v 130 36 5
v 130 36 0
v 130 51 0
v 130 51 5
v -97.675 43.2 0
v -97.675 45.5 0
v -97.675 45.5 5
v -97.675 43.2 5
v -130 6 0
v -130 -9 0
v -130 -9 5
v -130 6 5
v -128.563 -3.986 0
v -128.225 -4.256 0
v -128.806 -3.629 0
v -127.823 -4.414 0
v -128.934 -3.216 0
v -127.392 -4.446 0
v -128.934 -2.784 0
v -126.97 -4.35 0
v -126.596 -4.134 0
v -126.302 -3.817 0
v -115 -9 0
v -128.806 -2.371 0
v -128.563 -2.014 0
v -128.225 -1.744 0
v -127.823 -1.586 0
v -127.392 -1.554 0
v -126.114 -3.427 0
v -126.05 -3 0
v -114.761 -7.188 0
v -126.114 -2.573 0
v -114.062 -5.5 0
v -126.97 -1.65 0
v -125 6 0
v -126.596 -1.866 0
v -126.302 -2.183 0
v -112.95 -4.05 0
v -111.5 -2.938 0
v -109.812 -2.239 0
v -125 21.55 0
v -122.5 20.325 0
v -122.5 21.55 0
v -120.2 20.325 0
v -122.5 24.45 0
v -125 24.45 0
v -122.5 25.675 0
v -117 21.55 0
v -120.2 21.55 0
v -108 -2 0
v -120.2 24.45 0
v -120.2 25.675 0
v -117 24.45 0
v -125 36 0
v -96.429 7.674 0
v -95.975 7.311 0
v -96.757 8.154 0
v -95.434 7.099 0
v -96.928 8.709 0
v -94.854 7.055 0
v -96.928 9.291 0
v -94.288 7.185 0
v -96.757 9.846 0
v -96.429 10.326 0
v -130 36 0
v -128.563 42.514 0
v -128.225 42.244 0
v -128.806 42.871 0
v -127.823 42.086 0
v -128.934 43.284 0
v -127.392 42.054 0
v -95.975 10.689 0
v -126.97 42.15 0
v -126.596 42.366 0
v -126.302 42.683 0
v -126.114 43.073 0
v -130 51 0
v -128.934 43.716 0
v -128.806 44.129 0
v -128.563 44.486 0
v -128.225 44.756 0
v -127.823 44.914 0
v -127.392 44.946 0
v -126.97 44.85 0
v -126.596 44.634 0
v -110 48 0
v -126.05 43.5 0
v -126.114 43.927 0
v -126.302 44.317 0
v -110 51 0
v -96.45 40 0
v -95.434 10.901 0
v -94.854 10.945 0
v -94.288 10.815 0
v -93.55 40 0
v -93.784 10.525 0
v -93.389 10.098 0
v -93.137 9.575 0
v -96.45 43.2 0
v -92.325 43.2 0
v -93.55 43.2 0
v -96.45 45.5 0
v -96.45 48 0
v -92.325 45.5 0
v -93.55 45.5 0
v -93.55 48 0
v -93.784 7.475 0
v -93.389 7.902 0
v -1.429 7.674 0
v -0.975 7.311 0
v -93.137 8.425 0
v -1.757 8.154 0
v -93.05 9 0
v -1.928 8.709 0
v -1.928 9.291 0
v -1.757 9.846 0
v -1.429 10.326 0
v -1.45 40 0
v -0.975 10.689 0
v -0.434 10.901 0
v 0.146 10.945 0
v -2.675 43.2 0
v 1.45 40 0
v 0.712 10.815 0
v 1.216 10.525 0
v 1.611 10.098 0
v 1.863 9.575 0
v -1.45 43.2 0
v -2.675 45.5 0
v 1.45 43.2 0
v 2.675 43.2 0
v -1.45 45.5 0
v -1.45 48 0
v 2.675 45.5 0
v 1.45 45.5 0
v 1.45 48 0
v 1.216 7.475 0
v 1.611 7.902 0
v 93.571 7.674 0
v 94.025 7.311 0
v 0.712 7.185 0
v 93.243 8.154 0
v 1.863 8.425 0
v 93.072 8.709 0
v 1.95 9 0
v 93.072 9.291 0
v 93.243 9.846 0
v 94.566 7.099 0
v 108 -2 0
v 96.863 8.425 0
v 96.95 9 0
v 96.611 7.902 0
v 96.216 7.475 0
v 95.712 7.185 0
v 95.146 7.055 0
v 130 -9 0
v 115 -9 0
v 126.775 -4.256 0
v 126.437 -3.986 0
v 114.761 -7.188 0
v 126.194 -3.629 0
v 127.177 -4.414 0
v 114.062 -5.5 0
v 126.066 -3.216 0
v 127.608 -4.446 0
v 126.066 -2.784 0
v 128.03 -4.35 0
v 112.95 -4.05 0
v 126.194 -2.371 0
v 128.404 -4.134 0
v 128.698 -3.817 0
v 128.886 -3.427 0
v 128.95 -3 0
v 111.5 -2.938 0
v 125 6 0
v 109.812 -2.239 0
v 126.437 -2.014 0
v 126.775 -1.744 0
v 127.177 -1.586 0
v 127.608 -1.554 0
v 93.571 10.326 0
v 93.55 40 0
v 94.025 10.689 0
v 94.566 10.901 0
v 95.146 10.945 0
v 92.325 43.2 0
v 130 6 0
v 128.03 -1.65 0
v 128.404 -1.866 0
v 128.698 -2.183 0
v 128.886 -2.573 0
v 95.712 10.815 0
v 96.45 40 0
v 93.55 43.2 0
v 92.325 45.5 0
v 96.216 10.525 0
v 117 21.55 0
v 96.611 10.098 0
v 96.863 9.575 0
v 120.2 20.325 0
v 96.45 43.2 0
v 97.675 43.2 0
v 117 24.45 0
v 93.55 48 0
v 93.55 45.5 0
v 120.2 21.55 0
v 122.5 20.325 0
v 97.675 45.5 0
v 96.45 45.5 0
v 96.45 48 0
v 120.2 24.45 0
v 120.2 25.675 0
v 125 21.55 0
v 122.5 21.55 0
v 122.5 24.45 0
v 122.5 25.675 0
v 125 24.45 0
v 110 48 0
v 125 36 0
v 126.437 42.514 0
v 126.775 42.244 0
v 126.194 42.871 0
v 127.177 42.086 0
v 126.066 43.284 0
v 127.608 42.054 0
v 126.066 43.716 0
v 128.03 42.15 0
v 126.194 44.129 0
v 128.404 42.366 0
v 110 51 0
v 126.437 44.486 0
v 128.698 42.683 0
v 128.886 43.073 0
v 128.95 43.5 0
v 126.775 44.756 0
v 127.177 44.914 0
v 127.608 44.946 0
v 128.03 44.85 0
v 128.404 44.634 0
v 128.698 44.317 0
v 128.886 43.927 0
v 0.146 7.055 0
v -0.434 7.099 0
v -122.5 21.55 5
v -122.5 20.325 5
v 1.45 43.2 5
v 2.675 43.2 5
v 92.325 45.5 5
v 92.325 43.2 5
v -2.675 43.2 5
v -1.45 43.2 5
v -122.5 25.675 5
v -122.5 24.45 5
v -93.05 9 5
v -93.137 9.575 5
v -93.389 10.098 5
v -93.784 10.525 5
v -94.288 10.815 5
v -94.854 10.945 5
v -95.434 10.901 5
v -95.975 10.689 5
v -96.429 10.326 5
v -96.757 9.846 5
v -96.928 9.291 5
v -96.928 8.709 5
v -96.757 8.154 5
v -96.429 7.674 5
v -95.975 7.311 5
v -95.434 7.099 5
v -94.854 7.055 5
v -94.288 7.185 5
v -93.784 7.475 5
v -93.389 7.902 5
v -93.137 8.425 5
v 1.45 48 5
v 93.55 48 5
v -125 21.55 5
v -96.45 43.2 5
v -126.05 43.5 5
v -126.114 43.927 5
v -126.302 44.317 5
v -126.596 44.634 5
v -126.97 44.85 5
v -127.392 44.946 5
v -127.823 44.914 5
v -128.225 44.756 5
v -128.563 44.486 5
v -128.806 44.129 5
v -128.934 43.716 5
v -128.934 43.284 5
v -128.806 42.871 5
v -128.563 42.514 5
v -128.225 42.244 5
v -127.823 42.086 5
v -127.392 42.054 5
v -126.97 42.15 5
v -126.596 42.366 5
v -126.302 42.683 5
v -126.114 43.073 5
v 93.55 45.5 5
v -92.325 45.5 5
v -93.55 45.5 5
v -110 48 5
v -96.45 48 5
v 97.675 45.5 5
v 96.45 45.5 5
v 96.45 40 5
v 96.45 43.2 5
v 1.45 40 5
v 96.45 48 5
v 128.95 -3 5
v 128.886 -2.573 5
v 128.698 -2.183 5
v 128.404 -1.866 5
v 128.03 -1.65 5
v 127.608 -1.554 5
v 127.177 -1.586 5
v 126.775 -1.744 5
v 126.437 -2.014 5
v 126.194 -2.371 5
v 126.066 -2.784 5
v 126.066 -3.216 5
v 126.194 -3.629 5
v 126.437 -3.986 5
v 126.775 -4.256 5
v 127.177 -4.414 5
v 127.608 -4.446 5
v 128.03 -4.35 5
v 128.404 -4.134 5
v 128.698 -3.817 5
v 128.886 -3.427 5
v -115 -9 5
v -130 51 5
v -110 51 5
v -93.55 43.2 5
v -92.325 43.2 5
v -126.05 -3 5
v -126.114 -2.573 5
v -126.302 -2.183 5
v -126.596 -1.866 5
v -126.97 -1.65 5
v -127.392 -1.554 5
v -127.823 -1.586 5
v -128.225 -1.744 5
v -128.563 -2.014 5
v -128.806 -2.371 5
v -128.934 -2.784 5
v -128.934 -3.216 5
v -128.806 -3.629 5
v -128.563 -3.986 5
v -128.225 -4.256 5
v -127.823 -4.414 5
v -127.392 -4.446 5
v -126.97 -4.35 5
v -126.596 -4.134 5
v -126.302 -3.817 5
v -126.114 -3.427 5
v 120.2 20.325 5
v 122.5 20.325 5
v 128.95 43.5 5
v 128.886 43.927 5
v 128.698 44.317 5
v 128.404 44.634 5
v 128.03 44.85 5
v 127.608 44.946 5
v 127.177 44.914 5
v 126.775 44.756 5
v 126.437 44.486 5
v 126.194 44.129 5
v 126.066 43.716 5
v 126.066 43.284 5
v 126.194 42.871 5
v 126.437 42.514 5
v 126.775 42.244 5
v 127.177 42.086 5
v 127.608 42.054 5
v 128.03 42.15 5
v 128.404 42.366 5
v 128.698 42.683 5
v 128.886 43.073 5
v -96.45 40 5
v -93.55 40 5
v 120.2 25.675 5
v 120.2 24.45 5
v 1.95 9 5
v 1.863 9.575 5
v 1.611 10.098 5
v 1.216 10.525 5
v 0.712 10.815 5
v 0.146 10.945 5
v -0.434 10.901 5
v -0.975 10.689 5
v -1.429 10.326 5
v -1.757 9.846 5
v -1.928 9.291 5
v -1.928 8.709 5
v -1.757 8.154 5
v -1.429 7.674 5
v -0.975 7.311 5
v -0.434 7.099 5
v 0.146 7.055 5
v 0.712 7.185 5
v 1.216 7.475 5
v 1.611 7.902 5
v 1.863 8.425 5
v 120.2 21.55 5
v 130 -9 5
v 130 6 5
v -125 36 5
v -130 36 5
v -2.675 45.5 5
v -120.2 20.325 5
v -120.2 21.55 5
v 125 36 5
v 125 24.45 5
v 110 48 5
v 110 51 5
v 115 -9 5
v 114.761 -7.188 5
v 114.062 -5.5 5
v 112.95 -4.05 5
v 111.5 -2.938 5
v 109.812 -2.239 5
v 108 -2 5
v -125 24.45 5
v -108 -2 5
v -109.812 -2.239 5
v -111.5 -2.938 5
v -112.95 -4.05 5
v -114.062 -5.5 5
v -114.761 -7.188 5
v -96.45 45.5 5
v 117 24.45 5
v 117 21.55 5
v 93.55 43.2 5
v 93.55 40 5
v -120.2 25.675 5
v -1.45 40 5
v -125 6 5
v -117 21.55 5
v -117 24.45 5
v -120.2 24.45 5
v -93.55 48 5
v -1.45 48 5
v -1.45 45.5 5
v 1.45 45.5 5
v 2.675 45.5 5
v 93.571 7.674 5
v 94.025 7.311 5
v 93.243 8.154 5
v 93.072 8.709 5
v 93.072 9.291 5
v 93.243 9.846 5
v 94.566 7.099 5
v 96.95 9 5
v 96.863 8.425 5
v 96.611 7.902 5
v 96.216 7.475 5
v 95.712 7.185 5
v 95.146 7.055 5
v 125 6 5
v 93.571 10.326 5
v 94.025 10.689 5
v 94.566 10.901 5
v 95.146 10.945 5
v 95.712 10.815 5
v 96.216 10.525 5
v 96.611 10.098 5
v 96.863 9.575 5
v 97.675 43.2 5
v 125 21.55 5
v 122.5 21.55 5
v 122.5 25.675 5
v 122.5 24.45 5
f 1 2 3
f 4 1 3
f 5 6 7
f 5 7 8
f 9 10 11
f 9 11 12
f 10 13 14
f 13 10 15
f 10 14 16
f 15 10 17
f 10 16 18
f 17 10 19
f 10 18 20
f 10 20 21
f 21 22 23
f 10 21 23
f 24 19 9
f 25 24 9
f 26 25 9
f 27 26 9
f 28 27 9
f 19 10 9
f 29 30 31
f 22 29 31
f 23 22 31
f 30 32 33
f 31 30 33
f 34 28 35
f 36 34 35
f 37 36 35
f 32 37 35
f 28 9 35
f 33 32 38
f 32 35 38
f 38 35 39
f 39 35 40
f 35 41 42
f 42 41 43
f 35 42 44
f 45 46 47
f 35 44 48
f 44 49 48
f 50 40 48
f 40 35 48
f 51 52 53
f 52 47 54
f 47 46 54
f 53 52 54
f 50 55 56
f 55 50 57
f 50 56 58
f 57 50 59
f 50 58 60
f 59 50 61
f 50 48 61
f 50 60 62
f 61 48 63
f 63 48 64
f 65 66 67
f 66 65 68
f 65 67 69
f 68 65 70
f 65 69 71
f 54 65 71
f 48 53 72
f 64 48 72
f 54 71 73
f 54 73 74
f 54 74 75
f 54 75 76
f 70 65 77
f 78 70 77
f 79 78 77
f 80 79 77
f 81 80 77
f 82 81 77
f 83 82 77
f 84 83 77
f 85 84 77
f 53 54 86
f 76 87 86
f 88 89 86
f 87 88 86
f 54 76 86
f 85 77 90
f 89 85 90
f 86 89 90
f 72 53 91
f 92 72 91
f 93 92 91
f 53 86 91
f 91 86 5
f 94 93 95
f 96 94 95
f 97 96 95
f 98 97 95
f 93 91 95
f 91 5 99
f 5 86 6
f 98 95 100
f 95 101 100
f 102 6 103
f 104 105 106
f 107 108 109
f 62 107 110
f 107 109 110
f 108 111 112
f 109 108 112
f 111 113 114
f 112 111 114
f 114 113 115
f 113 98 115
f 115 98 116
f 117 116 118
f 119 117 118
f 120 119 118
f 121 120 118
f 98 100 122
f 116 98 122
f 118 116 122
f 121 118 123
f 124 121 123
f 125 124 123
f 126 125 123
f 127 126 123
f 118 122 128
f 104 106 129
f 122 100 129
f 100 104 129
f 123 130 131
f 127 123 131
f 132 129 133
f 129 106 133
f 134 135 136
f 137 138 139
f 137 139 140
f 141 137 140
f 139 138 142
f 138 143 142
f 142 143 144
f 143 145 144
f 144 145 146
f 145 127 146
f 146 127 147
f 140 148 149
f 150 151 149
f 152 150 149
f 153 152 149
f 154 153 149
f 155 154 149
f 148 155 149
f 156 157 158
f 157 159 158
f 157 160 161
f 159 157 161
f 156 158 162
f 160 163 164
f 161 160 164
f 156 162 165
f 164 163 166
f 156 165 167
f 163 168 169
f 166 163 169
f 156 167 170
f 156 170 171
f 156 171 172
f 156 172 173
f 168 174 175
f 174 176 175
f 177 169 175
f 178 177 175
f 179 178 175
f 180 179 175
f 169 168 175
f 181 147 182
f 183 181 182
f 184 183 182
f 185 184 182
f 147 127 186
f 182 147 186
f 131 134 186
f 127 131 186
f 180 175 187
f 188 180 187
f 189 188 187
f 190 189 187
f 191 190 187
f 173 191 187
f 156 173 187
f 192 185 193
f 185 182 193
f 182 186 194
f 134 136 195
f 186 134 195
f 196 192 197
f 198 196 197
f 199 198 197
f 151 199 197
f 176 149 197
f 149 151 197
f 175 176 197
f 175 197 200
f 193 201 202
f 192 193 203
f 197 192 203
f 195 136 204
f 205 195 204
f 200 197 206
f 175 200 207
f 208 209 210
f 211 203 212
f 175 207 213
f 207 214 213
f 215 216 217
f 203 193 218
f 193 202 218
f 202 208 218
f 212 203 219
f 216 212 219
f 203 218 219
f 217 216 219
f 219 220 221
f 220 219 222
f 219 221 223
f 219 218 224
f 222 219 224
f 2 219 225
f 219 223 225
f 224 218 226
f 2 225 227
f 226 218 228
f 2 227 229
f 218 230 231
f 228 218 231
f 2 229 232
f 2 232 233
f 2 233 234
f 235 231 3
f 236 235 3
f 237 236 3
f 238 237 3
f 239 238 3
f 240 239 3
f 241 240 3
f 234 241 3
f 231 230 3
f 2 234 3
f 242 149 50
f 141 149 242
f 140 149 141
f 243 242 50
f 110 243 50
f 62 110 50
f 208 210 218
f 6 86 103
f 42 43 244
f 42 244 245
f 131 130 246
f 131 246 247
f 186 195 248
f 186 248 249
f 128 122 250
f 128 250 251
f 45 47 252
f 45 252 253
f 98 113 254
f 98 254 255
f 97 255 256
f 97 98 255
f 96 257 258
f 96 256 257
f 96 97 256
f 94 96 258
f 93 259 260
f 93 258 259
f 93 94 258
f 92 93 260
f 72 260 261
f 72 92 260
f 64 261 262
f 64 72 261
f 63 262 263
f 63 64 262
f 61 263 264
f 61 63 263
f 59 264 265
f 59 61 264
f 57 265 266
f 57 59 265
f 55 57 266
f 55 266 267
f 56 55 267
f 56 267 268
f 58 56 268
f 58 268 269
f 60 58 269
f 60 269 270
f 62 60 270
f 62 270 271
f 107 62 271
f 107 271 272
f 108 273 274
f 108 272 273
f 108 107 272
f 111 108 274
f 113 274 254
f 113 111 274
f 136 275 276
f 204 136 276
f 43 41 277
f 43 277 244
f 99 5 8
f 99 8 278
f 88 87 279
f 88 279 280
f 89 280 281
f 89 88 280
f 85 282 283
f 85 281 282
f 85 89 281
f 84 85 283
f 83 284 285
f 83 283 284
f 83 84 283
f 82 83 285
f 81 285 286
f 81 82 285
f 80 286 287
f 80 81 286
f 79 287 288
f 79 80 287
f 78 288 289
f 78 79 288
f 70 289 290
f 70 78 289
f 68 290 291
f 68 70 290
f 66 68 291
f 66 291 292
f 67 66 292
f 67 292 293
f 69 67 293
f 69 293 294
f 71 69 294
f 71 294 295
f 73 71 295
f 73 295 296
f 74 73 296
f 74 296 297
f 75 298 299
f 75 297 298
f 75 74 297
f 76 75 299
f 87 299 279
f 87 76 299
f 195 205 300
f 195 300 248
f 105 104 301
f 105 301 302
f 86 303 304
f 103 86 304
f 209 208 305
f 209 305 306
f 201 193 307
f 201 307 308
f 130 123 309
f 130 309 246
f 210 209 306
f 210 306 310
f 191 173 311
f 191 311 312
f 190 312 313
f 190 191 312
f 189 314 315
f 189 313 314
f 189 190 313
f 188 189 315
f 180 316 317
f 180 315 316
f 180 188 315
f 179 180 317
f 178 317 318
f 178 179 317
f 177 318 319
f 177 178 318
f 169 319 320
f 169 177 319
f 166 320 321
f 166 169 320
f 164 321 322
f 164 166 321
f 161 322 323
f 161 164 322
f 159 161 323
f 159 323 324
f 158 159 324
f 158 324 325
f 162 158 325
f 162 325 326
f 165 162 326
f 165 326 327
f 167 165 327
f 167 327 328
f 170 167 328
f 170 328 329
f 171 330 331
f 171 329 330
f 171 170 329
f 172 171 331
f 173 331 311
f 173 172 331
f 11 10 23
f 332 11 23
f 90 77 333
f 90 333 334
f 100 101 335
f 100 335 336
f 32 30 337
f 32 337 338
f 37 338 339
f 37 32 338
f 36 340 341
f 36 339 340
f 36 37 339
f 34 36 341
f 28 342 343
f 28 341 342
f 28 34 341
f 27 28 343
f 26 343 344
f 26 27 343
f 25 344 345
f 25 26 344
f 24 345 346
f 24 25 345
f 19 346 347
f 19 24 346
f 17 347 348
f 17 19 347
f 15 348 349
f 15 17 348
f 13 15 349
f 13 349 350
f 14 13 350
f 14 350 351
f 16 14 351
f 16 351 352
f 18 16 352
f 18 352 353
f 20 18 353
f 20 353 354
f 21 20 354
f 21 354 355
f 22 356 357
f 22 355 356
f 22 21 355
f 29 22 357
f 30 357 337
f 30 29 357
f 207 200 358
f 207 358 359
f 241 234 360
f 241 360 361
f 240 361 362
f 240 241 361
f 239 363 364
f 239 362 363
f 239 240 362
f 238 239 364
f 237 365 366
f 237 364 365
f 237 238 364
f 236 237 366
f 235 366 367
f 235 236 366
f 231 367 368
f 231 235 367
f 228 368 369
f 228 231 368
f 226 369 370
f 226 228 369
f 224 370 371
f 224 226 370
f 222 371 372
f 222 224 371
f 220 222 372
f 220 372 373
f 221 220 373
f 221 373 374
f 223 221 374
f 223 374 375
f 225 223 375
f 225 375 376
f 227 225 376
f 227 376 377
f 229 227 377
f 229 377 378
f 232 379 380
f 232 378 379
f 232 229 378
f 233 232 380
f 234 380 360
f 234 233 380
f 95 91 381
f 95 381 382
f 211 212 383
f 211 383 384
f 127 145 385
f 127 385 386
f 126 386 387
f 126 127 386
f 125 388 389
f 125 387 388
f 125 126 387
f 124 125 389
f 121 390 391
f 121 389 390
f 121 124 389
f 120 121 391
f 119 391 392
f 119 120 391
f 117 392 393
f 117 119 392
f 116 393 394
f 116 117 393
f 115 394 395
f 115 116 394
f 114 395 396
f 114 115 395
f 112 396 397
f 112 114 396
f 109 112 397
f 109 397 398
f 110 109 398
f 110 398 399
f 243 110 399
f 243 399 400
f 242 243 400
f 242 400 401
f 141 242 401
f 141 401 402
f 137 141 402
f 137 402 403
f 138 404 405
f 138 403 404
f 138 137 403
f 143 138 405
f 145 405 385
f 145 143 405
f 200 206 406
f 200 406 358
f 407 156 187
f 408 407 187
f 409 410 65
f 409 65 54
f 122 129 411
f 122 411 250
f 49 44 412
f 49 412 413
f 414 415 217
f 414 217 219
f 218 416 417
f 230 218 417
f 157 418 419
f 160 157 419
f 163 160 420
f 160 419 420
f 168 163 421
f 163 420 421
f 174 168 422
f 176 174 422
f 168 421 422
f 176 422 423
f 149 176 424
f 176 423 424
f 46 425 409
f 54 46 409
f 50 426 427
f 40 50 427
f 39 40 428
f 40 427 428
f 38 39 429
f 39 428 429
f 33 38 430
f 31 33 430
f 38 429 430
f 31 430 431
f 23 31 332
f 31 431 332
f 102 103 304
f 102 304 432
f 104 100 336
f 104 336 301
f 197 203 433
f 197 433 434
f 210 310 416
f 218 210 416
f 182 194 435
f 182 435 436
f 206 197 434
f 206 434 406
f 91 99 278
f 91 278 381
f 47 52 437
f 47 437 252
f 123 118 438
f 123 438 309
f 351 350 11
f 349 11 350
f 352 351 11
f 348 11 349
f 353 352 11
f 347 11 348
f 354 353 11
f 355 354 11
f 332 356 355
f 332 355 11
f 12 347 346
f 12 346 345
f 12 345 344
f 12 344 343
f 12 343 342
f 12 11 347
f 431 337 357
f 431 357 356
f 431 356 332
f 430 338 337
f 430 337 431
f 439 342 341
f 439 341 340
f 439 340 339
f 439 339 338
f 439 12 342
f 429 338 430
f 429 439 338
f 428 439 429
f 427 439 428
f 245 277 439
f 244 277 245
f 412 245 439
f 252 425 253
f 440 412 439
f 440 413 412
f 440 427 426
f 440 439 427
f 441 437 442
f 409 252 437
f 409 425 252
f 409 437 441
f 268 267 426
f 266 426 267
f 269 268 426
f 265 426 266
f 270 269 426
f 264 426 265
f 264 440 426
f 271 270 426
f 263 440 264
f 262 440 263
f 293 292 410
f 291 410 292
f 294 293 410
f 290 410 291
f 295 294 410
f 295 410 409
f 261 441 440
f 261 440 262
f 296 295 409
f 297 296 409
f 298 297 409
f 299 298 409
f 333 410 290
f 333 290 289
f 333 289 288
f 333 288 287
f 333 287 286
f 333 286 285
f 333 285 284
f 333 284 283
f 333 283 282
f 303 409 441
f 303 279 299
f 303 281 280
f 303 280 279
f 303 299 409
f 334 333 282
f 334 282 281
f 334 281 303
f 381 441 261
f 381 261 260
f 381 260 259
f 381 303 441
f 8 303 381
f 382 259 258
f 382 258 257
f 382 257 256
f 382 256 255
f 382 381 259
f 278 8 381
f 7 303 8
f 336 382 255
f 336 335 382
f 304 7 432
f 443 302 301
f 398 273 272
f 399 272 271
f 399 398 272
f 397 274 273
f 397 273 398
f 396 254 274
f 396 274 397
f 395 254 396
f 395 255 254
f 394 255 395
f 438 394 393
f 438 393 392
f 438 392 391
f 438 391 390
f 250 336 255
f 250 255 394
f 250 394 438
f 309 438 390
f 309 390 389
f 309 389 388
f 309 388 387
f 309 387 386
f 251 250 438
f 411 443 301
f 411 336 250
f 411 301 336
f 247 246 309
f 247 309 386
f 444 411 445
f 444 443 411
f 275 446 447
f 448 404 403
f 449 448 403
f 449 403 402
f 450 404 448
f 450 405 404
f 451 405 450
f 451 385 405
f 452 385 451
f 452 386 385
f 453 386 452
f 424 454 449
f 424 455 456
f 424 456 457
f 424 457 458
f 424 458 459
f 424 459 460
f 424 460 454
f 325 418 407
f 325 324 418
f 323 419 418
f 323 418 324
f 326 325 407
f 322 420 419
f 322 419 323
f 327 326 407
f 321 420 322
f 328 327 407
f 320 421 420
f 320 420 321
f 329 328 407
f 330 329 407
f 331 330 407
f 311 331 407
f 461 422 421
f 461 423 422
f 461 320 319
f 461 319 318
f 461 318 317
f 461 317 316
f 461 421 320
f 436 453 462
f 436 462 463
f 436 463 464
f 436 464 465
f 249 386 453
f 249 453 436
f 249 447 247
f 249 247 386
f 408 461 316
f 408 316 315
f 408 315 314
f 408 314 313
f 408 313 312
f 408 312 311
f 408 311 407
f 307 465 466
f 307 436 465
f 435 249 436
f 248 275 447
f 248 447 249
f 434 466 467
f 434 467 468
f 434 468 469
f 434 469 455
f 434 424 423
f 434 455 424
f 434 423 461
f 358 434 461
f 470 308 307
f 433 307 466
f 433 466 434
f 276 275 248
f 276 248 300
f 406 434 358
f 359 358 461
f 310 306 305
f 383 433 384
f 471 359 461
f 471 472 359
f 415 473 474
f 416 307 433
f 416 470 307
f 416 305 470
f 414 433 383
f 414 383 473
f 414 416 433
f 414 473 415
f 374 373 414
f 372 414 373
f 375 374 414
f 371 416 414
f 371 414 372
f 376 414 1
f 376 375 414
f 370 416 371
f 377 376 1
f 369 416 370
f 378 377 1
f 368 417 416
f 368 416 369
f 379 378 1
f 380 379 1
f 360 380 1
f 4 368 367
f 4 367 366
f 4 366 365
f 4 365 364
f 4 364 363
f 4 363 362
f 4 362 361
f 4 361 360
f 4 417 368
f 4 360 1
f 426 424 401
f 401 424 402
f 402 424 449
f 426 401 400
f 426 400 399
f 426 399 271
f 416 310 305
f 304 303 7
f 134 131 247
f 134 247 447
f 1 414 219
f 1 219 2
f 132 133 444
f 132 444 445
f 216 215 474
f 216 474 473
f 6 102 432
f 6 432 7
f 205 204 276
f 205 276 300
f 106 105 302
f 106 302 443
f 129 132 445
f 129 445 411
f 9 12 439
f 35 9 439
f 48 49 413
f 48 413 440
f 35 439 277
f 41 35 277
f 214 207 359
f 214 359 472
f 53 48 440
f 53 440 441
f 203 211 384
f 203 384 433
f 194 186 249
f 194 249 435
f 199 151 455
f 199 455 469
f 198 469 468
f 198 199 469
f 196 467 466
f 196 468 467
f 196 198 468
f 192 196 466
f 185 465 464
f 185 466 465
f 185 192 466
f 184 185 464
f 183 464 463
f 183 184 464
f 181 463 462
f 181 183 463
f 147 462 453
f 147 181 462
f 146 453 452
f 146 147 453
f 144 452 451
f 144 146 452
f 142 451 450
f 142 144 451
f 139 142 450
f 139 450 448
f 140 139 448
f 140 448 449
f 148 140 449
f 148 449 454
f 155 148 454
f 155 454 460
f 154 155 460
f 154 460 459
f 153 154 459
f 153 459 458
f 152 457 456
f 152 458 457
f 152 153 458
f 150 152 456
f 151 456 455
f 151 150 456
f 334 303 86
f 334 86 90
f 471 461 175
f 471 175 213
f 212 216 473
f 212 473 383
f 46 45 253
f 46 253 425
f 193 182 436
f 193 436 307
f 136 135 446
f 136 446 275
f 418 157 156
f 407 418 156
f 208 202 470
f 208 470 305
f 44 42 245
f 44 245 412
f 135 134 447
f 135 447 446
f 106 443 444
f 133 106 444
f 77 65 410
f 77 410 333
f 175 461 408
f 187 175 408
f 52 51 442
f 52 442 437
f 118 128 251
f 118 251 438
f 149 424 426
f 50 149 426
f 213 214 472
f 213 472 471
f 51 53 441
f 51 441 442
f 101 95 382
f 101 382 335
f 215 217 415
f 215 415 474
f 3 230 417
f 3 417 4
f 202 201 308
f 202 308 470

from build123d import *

# Parameters (mm, degrees)
SKETCH1_W               = 260
SKETCH1_H               = 60
BOSS_EXTRUDE1_DEPTH     = 5
SKETCH2_W               = 5
SKETCH2_H               = 30
SKETCH2_W_2             = 220
SKETCH2_H_2             = 3
CUT_EXTRUDE1_DEPTH      = 140.73546436
CUT_EXTRUDE2_DEPTH      = 140.73546436
CUT_EXTRUDE2_DEPTH_BACK = 140.73546436
SKETCH3_R               = 1.45
SKETCH3_R_2             = 1.95


with BuildPart() as part:
    # Sketch1 → Boss-Extrude1 (new body)
    with BuildSketch(Plane.XY):
        with Locations((0, 21)):
            Rectangle(SKETCH1_W, SKETCH1_H)
    extrude(amount=BOSS_EXTRUDE1_DEPTH)

    # Sketch2 → Cut-Extrude1 (cut, through all)
    with BuildSketch(Plane.XY.offset(5)):
        with Locations((-127.5, 21)):
            Rectangle(SKETCH2_W, SKETCH2_H)
        with Locations((0, 49.5)):
            Rectangle(SKETCH2_W_2, SKETCH2_H_2)
        with Locations((127.5, 21)):
            Rectangle(SKETCH2_W, SKETCH2_H)
        with BuildLine():
            Line((108, -2), (-108, -2))
            ThreePointArc((-108, -2), (-103.050252532, -4.050252532), (-101, -9))
            Line((-101, -9), (101, -9))
            ThreePointArc((101, -9), (103.050252532, -4.050252532), (108, -2))
        make_face()
        with BuildLine():
            Line((108, -9), (115, -9))
            ThreePointArc((115, -9), (112.949747468, -4.050252532), (108, -2))
            Line((108, -2), (108, -9))
        make_face()
        with BuildLine():
            Line((108, -9), (108, -2))
            ThreePointArc((108, -2), (103.050252532, -4.050252532), (101, -9))
            Line((101, -9), (108, -9))
        make_face()
        with BuildLine():
            ThreePointArc((-108, -2), (-112.949747468, -4.050252532), (-115, -9))
            Line((-115, -9), (-108, -9))
            Line((-108, -9), (-108, -2))
        make_face()
        with BuildLine():
            ThreePointArc((-101, -9), (-103.050252532, -4.050252532), (-108, -2))
            Line((-108, -2), (-108, -9))
            Line((-108, -9), (-101, -9))
        make_face()
    extrude(amount=-CUT_EXTRUDE1_DEPTH, mode=Mode.SUBTRACT)

    # Sketch3 → Cut-Extrude2 (cut, two sides: drawn at the far end of the back side and taken through both)
    with BuildSketch(Plane.XY.offset(5).offset(-CUT_EXTRUDE2_DEPTH_BACK)):
        Polygon((-96.45, 43.2), (-96.45, 40), (-93.55, 40), (-93.55, 43.2), (-92.325, 43.2), (-92.325, 45.5), (-93.55, 45.5), (-93.55, 48), (-96.45, 48), (-96.45, 45.5), (-97.675, 45.5), (-97.675, 43.2), align=None)
        Polygon((97.675, 43.2), (97.675, 45.5), (96.45, 45.5), (96.45, 48), (93.55, 48), (93.55, 45.5), (92.325, 45.5), (92.325, 43.2), (93.55, 43.2), (93.55, 40), (96.45, 40), (96.45, 43.2), align=None)
        Polygon((125, 21.55), (125, 24.45), (122.5, 24.45), (122.5, 25.675), (120.2, 25.675), (120.2, 24.45), (117, 24.45), (117, 21.55), (120.2, 21.55), (120.2, 20.325), (122.5, 20.325), (122.5, 21.55), align=None)
        Polygon((-2.675, 45.5), (-2.675, 43.2), (-1.45, 43.2), (-1.45, 40), (1.45, 40), (1.45, 43.2), (2.675, 43.2), (2.675, 45.5), (1.45, 45.5), (1.45, 48), (-1.45, 48), (-1.45, 45.5), align=None)
        Polygon((-120.2, 21.55), (-117, 21.55), (-117, 24.45), (-120.2, 24.45), (-120.2, 25.675), (-122.5, 25.675), (-122.5, 24.45), (-125, 24.45), (-125, 21.55), (-122.5, 21.55), (-122.5, 20.325), (-120.2, 20.325), align=None)
        with Locations((-127.5, 43.5)):
            Circle(SKETCH3_R)
        with Locations((-127.5, -3)):
            Circle(SKETCH3_R)
        with Locations((127.5, -3)):
            Circle(SKETCH3_R)
        with Locations((127.5, 43.5)):
            Circle(SKETCH3_R)
        with Locations((-95, 9)):
            Circle(SKETCH3_R_2)
        with Locations((95, 9)):
            Circle(SKETCH3_R_2)
        with Locations((0, 9)):
            Circle(SKETCH3_R_2)
    extrude(amount=CUT_EXTRUDE2_DEPTH + CUT_EXTRUDE2_DEPTH_BACK, mode=Mode.SUBTRACT)


solid = part.part
